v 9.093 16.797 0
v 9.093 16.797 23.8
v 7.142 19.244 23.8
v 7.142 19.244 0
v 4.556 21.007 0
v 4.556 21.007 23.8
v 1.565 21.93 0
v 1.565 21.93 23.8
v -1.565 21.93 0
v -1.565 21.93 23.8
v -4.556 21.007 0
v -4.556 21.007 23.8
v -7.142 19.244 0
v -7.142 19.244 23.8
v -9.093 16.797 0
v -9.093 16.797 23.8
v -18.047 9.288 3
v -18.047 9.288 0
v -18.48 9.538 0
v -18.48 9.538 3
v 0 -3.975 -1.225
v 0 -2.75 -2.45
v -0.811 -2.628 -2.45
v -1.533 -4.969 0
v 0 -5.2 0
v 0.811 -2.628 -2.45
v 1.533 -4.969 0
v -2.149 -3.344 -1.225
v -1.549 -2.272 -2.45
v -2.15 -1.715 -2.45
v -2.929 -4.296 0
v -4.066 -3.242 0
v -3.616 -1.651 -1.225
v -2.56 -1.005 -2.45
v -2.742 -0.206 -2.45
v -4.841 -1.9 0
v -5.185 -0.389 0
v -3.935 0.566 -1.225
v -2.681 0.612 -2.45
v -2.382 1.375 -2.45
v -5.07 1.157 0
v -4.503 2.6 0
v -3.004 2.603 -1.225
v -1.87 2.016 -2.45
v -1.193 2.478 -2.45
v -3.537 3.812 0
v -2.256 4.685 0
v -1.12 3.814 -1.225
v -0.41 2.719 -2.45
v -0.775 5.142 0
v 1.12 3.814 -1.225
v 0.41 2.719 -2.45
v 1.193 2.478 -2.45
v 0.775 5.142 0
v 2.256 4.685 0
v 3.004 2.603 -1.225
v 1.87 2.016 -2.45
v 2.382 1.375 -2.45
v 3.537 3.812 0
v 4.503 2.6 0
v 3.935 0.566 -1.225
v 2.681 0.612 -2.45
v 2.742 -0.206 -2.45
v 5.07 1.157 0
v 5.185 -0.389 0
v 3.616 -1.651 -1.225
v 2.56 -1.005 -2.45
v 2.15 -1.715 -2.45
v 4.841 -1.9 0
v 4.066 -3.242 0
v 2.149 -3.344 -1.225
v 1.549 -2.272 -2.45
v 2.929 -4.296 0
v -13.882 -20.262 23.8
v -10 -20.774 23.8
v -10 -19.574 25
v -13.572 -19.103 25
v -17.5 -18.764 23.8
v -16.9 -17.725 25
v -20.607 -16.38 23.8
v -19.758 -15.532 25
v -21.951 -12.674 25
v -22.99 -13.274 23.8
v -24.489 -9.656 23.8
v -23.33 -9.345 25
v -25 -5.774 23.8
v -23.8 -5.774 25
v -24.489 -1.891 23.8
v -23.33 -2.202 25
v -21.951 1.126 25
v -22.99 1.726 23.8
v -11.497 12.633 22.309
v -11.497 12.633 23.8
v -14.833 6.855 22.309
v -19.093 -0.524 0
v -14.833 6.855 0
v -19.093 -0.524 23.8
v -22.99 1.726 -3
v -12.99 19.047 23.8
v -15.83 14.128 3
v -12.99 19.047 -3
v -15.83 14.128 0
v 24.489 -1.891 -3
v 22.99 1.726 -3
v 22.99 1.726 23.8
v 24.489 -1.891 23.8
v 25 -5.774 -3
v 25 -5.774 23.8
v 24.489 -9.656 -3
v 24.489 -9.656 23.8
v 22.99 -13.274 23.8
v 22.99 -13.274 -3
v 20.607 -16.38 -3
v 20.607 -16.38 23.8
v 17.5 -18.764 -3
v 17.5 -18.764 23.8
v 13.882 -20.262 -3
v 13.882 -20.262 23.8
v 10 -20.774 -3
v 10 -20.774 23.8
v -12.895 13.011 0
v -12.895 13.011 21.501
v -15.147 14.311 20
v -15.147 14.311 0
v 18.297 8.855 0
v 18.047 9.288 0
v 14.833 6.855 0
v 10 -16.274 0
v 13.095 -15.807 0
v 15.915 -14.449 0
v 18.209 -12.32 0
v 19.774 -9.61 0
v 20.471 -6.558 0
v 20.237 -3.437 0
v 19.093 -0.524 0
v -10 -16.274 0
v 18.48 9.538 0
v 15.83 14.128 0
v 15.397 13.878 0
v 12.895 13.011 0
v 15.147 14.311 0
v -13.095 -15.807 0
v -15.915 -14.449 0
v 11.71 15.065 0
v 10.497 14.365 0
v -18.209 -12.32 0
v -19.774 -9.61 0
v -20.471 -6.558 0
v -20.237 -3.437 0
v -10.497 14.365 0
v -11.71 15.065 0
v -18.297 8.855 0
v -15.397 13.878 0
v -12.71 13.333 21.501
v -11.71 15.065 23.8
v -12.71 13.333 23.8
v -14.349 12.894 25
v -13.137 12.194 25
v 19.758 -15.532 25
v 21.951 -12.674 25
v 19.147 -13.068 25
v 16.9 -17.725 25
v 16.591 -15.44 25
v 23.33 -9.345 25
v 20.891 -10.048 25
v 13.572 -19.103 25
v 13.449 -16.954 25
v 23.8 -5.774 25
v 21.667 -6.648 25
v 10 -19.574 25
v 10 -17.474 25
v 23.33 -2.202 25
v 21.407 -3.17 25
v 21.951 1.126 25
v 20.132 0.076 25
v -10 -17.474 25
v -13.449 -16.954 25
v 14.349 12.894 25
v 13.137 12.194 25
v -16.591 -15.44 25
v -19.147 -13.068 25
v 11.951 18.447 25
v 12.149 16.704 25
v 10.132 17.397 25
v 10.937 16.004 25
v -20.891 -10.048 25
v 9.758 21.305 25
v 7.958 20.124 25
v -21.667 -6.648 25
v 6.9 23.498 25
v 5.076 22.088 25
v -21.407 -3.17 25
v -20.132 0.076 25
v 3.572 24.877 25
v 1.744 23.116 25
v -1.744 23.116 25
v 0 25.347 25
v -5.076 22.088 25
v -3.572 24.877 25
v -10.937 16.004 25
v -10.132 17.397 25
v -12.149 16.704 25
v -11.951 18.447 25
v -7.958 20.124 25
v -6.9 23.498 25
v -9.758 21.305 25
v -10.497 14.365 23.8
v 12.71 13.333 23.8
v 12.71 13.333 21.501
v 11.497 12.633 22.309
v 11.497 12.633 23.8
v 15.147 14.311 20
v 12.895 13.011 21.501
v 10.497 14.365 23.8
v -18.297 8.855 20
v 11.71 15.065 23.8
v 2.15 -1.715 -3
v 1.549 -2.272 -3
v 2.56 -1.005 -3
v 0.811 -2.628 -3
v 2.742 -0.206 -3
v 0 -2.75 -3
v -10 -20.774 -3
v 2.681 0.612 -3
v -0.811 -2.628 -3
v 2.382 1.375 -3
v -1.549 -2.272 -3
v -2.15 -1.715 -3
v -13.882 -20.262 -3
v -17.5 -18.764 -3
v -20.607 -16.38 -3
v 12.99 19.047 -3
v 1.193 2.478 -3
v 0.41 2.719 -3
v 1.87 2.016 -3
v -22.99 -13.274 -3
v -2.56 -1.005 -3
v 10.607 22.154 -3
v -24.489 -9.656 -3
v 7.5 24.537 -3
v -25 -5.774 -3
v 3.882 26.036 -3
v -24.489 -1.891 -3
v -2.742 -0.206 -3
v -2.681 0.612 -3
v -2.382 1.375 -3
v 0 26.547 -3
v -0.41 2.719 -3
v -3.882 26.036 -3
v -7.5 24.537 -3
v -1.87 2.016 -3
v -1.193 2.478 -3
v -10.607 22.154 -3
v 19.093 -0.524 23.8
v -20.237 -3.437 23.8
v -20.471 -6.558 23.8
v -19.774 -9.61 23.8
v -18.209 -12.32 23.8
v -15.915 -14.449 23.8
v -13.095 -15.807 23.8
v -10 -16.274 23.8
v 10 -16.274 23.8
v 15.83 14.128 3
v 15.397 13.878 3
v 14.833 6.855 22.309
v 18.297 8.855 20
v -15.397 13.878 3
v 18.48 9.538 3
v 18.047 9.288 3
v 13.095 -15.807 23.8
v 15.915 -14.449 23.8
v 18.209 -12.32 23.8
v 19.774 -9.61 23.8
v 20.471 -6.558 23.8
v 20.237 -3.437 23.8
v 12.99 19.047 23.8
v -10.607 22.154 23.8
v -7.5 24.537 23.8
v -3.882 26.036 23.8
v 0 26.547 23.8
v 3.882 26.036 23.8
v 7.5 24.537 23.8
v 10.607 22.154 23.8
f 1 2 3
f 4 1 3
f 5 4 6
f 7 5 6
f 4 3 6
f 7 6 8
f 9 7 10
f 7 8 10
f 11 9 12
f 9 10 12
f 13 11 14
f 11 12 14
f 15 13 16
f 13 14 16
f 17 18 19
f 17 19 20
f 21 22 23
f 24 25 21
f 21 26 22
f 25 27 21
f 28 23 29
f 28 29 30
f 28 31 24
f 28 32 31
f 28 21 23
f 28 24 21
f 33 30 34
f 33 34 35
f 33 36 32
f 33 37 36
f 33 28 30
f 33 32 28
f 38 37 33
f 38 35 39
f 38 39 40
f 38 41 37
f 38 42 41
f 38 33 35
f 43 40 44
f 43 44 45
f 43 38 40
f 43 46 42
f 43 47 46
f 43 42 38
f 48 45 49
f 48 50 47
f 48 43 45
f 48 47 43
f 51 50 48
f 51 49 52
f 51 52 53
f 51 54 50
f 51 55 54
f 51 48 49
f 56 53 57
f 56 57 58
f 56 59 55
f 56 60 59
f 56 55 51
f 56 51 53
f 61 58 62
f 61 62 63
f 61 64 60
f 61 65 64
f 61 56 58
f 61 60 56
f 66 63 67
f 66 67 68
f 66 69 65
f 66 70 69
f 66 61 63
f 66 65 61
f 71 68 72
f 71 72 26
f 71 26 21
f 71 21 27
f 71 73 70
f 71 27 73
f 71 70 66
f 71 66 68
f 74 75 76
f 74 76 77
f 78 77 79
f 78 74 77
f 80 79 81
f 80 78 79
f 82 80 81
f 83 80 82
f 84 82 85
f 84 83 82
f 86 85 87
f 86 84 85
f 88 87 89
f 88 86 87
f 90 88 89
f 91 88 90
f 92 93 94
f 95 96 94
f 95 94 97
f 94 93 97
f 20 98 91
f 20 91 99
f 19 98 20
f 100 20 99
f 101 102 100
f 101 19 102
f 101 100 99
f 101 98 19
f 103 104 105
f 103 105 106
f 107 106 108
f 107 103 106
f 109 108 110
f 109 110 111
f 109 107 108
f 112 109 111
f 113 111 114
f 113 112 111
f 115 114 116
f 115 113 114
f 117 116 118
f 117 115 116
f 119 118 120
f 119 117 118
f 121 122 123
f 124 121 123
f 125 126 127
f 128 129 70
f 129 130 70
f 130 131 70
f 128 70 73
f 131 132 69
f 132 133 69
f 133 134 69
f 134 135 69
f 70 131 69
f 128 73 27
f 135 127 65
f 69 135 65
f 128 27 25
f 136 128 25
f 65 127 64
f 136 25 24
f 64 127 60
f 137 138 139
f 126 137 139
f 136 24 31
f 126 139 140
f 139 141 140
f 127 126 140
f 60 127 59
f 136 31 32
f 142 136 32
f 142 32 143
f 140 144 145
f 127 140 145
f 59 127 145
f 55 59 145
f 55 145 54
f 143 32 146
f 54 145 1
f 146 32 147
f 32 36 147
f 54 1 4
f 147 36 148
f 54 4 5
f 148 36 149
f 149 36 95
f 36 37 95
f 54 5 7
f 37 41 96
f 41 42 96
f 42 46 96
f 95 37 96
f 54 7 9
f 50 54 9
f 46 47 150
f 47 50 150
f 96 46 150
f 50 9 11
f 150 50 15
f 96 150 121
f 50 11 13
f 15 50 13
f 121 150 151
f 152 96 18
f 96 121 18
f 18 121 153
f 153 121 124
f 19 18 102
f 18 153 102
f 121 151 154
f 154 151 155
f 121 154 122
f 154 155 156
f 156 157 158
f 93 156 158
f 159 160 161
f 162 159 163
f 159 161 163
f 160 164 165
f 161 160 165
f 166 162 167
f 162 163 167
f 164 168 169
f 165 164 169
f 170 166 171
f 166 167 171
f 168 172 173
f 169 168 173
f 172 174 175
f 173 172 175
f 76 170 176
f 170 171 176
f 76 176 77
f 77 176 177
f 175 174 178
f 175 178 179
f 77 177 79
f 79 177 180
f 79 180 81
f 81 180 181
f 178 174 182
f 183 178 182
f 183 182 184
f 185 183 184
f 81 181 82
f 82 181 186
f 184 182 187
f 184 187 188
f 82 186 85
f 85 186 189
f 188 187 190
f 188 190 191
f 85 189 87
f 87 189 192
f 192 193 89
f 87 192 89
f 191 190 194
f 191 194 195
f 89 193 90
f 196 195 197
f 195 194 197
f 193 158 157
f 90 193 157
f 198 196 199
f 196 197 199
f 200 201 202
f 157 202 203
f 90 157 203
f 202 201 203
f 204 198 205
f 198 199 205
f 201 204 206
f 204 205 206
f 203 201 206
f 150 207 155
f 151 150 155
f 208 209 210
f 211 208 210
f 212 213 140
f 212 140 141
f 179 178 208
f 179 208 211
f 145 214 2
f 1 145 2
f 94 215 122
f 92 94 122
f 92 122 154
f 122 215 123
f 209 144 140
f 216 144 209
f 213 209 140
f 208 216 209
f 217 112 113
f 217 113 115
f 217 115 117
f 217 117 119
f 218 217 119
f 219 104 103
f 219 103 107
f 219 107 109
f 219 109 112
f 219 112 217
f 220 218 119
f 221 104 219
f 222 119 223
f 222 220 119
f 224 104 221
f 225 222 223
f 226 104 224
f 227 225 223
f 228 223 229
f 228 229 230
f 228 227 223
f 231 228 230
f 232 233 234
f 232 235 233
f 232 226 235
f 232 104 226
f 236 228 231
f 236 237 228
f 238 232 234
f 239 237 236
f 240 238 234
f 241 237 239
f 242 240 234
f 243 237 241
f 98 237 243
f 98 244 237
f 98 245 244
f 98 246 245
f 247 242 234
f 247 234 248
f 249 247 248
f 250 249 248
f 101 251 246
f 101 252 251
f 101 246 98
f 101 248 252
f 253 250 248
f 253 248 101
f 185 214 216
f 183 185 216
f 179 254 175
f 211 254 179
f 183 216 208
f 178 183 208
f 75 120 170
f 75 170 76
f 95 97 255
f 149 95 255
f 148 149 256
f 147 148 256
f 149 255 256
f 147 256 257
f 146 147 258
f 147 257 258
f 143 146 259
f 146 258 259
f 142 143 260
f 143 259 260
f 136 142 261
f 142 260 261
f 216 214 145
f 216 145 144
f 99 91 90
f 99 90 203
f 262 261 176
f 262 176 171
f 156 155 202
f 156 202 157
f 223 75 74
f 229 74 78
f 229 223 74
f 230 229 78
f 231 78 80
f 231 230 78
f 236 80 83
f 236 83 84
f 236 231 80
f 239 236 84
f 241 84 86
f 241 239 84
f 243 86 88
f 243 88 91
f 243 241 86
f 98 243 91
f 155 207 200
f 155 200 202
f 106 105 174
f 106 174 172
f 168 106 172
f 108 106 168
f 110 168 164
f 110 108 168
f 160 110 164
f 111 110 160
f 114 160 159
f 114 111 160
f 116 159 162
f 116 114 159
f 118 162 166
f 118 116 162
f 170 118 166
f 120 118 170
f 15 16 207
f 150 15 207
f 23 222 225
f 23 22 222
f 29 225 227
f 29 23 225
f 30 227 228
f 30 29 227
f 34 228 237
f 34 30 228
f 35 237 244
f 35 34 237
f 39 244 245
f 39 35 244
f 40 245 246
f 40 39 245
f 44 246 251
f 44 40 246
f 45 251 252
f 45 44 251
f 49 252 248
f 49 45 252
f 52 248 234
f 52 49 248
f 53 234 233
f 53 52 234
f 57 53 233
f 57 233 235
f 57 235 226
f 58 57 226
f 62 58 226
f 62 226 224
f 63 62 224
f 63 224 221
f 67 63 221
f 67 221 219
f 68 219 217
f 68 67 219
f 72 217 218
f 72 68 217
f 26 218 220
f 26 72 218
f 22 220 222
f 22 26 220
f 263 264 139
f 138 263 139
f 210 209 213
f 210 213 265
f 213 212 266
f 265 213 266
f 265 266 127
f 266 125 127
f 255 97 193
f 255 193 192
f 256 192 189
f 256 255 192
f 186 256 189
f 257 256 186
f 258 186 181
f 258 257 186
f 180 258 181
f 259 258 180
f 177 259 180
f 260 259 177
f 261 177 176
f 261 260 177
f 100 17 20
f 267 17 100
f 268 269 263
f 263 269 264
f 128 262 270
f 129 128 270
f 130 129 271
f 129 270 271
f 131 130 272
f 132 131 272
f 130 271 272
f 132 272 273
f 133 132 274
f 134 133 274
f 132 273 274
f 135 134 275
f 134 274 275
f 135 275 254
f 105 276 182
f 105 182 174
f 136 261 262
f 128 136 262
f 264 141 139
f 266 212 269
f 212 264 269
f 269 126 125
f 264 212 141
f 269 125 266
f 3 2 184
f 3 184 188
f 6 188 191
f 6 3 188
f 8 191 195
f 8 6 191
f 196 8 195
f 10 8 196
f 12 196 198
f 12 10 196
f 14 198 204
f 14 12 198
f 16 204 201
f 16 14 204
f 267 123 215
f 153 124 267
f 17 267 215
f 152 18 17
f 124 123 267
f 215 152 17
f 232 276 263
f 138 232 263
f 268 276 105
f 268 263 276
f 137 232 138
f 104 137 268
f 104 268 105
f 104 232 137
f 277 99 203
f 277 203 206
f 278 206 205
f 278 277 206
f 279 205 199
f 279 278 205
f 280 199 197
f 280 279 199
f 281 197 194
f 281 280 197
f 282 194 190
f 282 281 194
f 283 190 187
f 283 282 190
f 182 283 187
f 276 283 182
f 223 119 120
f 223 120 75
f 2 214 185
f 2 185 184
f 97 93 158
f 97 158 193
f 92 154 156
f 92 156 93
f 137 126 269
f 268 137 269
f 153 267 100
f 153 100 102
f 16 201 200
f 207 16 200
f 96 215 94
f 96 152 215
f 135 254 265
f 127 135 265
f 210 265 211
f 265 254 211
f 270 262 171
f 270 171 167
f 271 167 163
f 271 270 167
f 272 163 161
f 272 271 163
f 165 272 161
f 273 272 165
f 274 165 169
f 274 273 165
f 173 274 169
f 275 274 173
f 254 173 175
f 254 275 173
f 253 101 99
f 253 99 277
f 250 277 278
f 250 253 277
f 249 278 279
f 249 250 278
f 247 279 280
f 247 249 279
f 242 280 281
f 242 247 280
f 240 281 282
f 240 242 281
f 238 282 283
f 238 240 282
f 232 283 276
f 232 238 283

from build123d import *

# Parameters (mm, degrees)
BOSS_EXTRU_1_DEPTH      = 25
ENL_V_MAT_EXTRU_1_DEPTH = 20
ENL_V_MAT_EXTRU_2_DEPTH = 45.21248121115924
ENL_V_MAT_EXTRU_4_DEPTH = 20
ENL_V_MAT_EXTRU_3_DEPTH = 45.21248121115924
CHANFREIN1_SIZE         = 1.2
BOSS_EXTRU_2_START      = 3
BOSS_EXTRU_2_DEPTH      = 3
ENL_V_MAT_EXTRU_5_REACH = 47.001
ESQUISSE7_W             = 1.399999999999995
ESQUISSE7_H             = 20
CHANFREIN2_SIZE2        = 4
CHANFREIN2_SIZE         = 2.309401077
ENL_V_MAT_EXTRU_6_REACH = 60.237
CHANFREIN3_SIZE2        = 4
CHANFREIN3_SIZE         = 2.309401077


with BuildPart() as part:
    # Esquisse1 → Boss.-Extru.1 (new body)
    with BuildSketch(Plane.XY):
        with BuildLine():
            Line((-22.99038105676658, 1.7264973081037391), (-12.990381056766578, 19.047005383792516))
            ThreePointArc((-12.990381056766578, 19.047005383792516), (9.5e-16, 26.547005383792516), (12.990381056766578, 19.047005383792513))
            Line((12.990381056766578, 19.047005383792513), (22.990381056766577, 1.726497308103746))
            ThreePointArc((22.990381056766577, 1.726497308103746), (22.99038105676658, -13.273502691896258), (9.999999999999996, -20.77350269189626))
            Line((9.999999999999996, -20.77350269189626), (-10, -20.773502691896258))
            ThreePointArc((-10, -20.773502691896258), (-22.99038105676658, -13.273502691896255), (-22.99038105676658, 1.7264973081037391))
        make_face()
        with BuildLine():
            Line((-18.66025403784439, -0.7735026918962613), (-8.66025403784439, 16.547005383792516))
            ThreePointArc((-8.66025403784439, 16.547005383792516), (-2.69e-15, 21.547005383792516), (8.660254037844384, 16.547005383792516))
            Line((8.660254037844384, 16.547005383792516), (18.660254037844386, -0.7735026918962474))
            ThreePointArc((18.660254037844386, -0.7735026918962474), (18.660254037844393, -10.773502691896258), (10, -15.773502691896258))
            Line((10, -15.773502691896258), (-10, -15.773502691896258))
            ThreePointArc((-10, -15.773502691896258), (-18.66025403784439, -10.773502691896262), (-18.66025403784439, -0.7735026918962613))
        make_face(mode=Mode.SUBTRACT)
    extrude(amount=BOSS_EXTRU_1_DEPTH)

    # Esquisse2 → Enlèv. mat.-Extru.1 (cut)
    with BuildSketch(Plane.XY.offset(25)):
        Polygon((-10.914359353944898, 12.642780450695335), (-12.300000000000002, 13.442780450695334), (-11.600000000000003, 14.655216015993549), (-10.2143593539449, 13.855216015993548), align=None)
        Polygon((10.214359353944896, 13.855216015993548), (11.6, 14.655216015993549), (12.299999999999999, 13.442780450695334), (10.914359353944896, 12.642780450695334), align=None)
    extrude(amount=-ENL_V_MAT_EXTRU_1_DEPTH, mode=Mode.SUBTRACT)

    # Esquisse3 → Enlèv. mat.-Extru.2 (cut, through all)
    with BuildSketch(Plane.XY.offset(25)):
        Polygon((-10.064359353944898, 14.115023637128878), (-11.709807621135333, 15.06502363712888), (-12.709807621135335, 13.332972829560003), (-11.064359353944898, 12.382972829560003), align=None)
    enl_v_mat_extru_2 = extrude(amount=-ENL_V_MAT_EXTRU_2_DEPTH, mode=Mode.SUBTRACT)

    # Symétrie1: Enlèv. mat.-Extru.2 across plane
    add(enl_v_mat_extru_2.mirror(Plane(origin=(0, 0, 0), x_dir=(0, 0, 1), z_dir=(1, 0, 0))), mode=Mode.SUBTRACT)

    # Esquisse6 → Enlèv. mat.-Extru.4 (cut)
    with BuildSketch(Plane(origin=(0, 0, 0), x_dir=(-1, 0, 0), z_dir=(0, 0, -1))):
        Polygon((11.250000000000002, 12.061433798642659), (15.147114317029969, 14.31143379864266), (18.297114317029976, 8.855473754800698), (14.4, 6.605473754800695), align=None)
        Polygon((-11.249999999999998, 12.061433798642659), (-15.14711431702997, 14.311433798642657), (-18.297114317029973, 8.855473754800693), (-14.399999999999997, 6.605473754800696), align=None)
    extrude(amount=-ENL_V_MAT_EXTRU_4_DEPTH, mode=Mode.SUBTRACT)

    # Esquisse5 → Enlèv. mat.-Extru.3 (cut, through all)
    with BuildSketch(Plane.XY.offset(25)):
        with BuildLine():
            Line((-9.093266739736611, 16.797005383792516), (-10.497372055837118, 14.365023637128878))
            Line((-10.497372055837118, 14.365023637128878), (-11.497372055837118, 12.632972829560003))
            Line((-11.497372055837118, 12.632972829560003), (-19.093266739736613, -0.5235026918962613))
            ThreePointArc((-19.093266739736613, -0.5235026918962613), (-19.09326673973661, -11.023502691896262), (-10.000000000000002, -16.273502691896258))
            Line((-10.000000000000002, -16.273502691896258), (10.000000000000004, -16.273502691896258))
            ThreePointArc((10.000000000000004, -16.273502691896258), (19.09326673973661, -11.023502691896251), (19.093266739736602, -0.523502691896249))
            Line((19.093266739736602, -0.523502691896249), (11.497372055837113, 12.632972829560005))
            Line((11.497372055837113, 12.632972829560005), (10.497372055837118, 14.36502363712888))
            Line((10.497372055837118, 14.36502363712888), (9.0932667397366, 16.797005383792516))
            ThreePointArc((9.0932667397366, 16.797005383792516), (-2.66e-15, 22.047005383792516), (-9.093266739736611, 16.797005383792516))
        make_face()
        with BuildLine():
            Line((-8.66025403784439, 16.547005383792516), (-10.064359353944898, 14.115023637128878))
            Line((-10.064359353944898, 14.115023637128878), (-11.064359353944894, 12.382972829560005))
            Line((-11.064359353944894, 12.382972829560005), (-18.66025403784439, -0.7735026918962613))
            ThreePointArc((-18.66025403784439, -0.7735026918962613), (-18.66025403784439, -10.773502691896262), (-10, -15.773502691896258))
            Line((-10, -15.773502691896258), (10.000000000000002, -15.77350269189626))
            ThreePointArc((10.000000000000002, -15.77350269189626), (18.66025403784439, -10.773502691896255), (18.660254037844386, -0.7735026918962474))
            Line((18.660254037844386, -0.7735026918962474), (11.064359353944898, 12.382972829560003))
            Line((11.064359353944898, 12.382972829560003), (10.064359353944898, 14.115023637128878))
            Line((10.064359353944898, 14.115023637128878), (8.660254037844384, 16.547005383792516))
            ThreePointArc((8.660254037844384, 16.547005383792516), (-2.69e-15, 21.547005383792516), (-8.66025403784439, 16.547005383792516))
        make_face(mode=Mode.SUBTRACT)
    extrude(amount=-ENL_V_MAT_EXTRU_3_DEPTH, mode=Mode.SUBTRACT)

    # Chanfrein1
    chanfrein1_edges = [part.edges().sort_by_distance(p)[0] for p in [
        (22.99038105676658, -13.27350269189626, 25),
        (11.103589838486222, 14.715023637128876, 25),
        (-11.103589838486226, 14.71502363712888, 25),
        (-9.795319397786868, 15.581014510460694, 25),
        (9.795319397786855, 15.581014510460696, 25),
        (-7.11e-15, 22.047005383792516, 25),
        (-15.295319397786866, 6.054735068831872, 25),
        (-19.09326673973661, -11.023502691896262, 25),
        (1.78e-15, -16.273502691896258, 25),
        (19.093266739736606, -11.023502691896253, 25),
        (15.295319397786855, 6.054735068831873, 25),
        (17.990381056766577, 10.386751345948129, 25),
        (2.66e-15, 26.547005383792516, 25),
        (-17.99038105676658, 10.386751345948127, 25),
        (-22.99038105676658, -13.273502691896258, 25),
        (-12.209807621135333, 14.19899823334444, 25),
        (-12.103589838486226, 12.982972829560003, 25),
        (-1.78e-15, -20.77350269189626, 25),
        (12.209807621135335, 14.19899823334444, 25),
        (12.103589838486222, 12.982972829560001, 25),
    ]]
    chamfer(chanfrein1_edges, length=CHANFREIN1_SIZE)

    # Esquisse4 → Boss.-Extru.2 (add)
    with BuildSketch(Plane(origin=(0, 0, 0), x_dir=(-1, 0, 0), z_dir=(0, 0, -1)).offset(BOSS_EXTRU_2_START)):
        with BuildLine():
            Line((22.99038105676658, 1.7264973081037323), (12.990381056766578, 19.047005383792516))
            ThreePointArc((12.990381056766578, 19.047005383792516), (8.9e-16, 26.547005383792513), (-12.990381056766573, 19.047005383792513))
            Line((-12.990381056766573, 19.047005383792513), (-22.990381056766577, 1.726497308103746))
            ThreePointArc((-22.990381056766577, 1.726497308103746), (-22.99038105676658, -13.273502691896255), (-10.000000000000004, -20.773502691896258))
            Line((-10.000000000000004, -20.773502691896258), (9.999999999999996, -20.773502691896258))
            ThreePointArc((9.999999999999996, -20.773502691896258), (22.990381056766577, -13.273502691896262), (22.99038105676658, 1.7264973081037323))
        make_face()
    extrude(amount=-BOSS_EXTRU_2_DEPTH)

    # Esquisse7 → Enlèv. mat.-Extru.5 (cut, up to next)
    with BuildSketch(Plane(origin=(-2.5958946838994956, 4.496221483611885, 0), x_dir=(0.866025403784439, 0.4999999999999994, 0), z_dir=(-0.4999999999999994, 0.866025403784439, 0)), mode=Mode.PRIVATE) as enl_v_mat_extru_5_sk1:
        with Locations((16.973502691896265, -10)):
            Rectangle(ESQUISSE7_W, ESQUISSE7_H)
    enl_v_mat_extru_5_tool1 = extrude(enl_v_mat_extru_5_sk1.sketch, amount=-ENL_V_MAT_EXTRU_5_REACH, mode=Mode.PRIVATE) & part.part
    enl_v_mat_extru_5 = enl_v_mat_extru_5_tool1.solids().sort_by_distance((12.10359, 12.982973, 10))[0]
    add(enl_v_mat_extru_5, mode=Mode.SUBTRACT)

    # Symétrie2: Enlèv. mat.-Extru.5 across plane
    add(enl_v_mat_extru_5.mirror(Plane(origin=(0, 0, 0), x_dir=(0, 0, 1), z_dir=(1, 0, 0))), mode=Mode.SUBTRACT)

    # Chanfrein2
    chanfrein2_edges = [part.edges().sort_by_distance(p)[0] for p in [
        (13.16519237886467, 9.74422329218035, 20),
    ]]
    chanfrein2_side = [part.faces().sort_by_distance(p)[0] for p in [
        (13.16519237886467, 9.74422329218035, 20.04618802153517),
    ]]
    chamfer(chanfrein2_edges, length=CHANFREIN2_SIZE - 0.0001, length2=CHANFREIN2_SIZE2 - 0.0001, reference=chanfrein2_side[0])  # a hair under: the kernel refuses the full size

    # Esquisse8 → Enlèv. mat.-Extru.6 (cut, up to next)
    with BuildSketch(Plane(origin=(17.557368354874363, 10.13675134594814, 0), x_dir=(0, 0, 1), z_dir=(-0.8660254037844385, -0.5000000000000004, 0)), mode=Mode.PRIVATE) as enl_v_mat_extru_6_sk1:
        Polygon((3.0000000000000004, 4.320508075688777), (5.3e-16, 4.320508075688777), (8.7e-16, -0.9794919243112247), (3.000000000000001, -0.9794919243112244), align=None)
    enl_v_mat_extru_6_tool1 = extrude(enl_v_mat_extru_6_sk1.sketch, amount=-ENL_V_MAT_EXTRU_6_REACH, mode=Mode.PRIVATE) & part.part
    enl_v_mat_extru_6 = enl_v_mat_extru_6_tool1.solids().sort_by_distance((16.722114, 11.583454, 1.5))[0]
    add(enl_v_mat_extru_6, mode=Mode.SUBTRACT)

    # Symétrie3: Enlèv. mat.-Extru.6 across plane
    add(enl_v_mat_extru_6.mirror(Plane(origin=(0, 0, 0), x_dir=(0, 0, 1), z_dir=(1, 0, 0))), mode=Mode.SUBTRACT)

    # Chanfrein3
    chanfrein3_edges = [part.edges().sort_by_distance(p)[0] for p in [
        (-13.16519237886467, 9.74422329218035, 20),
    ]]
    chanfrein3_side = [part.faces().sort_by_distance(p)[0] for p in [
        (-13.16519237886467, 9.74422329218035, 20.04618802153517),
    ]]
    chamfer(chanfrein3_edges, length=CHANFREIN3_SIZE - 0.0001, length2=CHANFREIN3_SIZE2 - 0.0001, reference=chanfrein3_side[0])  # a hair under: the kernel refuses the full size

    # Esquisse10 → Fraisage pour vis à tête fraisée M51 (revolve, cut)
    with BuildSketch(Plane(origin=(0, 0, 0), x_dir=(0, -1, 0), z_dir=(1, 0, 0))):
        Polygon((0, 0), (-7.3e-16, 2.9999999999999996), (2.7499999999999996, 2.9999999999999996), (2.75, 2.449999999999999), (5.200000000000001, 0), align=None)
    revolve(axis=Axis((0, 0, 6.349999999999991), (0, 0, -1)), mode=Mode.SUBTRACT)


solid = part.part
